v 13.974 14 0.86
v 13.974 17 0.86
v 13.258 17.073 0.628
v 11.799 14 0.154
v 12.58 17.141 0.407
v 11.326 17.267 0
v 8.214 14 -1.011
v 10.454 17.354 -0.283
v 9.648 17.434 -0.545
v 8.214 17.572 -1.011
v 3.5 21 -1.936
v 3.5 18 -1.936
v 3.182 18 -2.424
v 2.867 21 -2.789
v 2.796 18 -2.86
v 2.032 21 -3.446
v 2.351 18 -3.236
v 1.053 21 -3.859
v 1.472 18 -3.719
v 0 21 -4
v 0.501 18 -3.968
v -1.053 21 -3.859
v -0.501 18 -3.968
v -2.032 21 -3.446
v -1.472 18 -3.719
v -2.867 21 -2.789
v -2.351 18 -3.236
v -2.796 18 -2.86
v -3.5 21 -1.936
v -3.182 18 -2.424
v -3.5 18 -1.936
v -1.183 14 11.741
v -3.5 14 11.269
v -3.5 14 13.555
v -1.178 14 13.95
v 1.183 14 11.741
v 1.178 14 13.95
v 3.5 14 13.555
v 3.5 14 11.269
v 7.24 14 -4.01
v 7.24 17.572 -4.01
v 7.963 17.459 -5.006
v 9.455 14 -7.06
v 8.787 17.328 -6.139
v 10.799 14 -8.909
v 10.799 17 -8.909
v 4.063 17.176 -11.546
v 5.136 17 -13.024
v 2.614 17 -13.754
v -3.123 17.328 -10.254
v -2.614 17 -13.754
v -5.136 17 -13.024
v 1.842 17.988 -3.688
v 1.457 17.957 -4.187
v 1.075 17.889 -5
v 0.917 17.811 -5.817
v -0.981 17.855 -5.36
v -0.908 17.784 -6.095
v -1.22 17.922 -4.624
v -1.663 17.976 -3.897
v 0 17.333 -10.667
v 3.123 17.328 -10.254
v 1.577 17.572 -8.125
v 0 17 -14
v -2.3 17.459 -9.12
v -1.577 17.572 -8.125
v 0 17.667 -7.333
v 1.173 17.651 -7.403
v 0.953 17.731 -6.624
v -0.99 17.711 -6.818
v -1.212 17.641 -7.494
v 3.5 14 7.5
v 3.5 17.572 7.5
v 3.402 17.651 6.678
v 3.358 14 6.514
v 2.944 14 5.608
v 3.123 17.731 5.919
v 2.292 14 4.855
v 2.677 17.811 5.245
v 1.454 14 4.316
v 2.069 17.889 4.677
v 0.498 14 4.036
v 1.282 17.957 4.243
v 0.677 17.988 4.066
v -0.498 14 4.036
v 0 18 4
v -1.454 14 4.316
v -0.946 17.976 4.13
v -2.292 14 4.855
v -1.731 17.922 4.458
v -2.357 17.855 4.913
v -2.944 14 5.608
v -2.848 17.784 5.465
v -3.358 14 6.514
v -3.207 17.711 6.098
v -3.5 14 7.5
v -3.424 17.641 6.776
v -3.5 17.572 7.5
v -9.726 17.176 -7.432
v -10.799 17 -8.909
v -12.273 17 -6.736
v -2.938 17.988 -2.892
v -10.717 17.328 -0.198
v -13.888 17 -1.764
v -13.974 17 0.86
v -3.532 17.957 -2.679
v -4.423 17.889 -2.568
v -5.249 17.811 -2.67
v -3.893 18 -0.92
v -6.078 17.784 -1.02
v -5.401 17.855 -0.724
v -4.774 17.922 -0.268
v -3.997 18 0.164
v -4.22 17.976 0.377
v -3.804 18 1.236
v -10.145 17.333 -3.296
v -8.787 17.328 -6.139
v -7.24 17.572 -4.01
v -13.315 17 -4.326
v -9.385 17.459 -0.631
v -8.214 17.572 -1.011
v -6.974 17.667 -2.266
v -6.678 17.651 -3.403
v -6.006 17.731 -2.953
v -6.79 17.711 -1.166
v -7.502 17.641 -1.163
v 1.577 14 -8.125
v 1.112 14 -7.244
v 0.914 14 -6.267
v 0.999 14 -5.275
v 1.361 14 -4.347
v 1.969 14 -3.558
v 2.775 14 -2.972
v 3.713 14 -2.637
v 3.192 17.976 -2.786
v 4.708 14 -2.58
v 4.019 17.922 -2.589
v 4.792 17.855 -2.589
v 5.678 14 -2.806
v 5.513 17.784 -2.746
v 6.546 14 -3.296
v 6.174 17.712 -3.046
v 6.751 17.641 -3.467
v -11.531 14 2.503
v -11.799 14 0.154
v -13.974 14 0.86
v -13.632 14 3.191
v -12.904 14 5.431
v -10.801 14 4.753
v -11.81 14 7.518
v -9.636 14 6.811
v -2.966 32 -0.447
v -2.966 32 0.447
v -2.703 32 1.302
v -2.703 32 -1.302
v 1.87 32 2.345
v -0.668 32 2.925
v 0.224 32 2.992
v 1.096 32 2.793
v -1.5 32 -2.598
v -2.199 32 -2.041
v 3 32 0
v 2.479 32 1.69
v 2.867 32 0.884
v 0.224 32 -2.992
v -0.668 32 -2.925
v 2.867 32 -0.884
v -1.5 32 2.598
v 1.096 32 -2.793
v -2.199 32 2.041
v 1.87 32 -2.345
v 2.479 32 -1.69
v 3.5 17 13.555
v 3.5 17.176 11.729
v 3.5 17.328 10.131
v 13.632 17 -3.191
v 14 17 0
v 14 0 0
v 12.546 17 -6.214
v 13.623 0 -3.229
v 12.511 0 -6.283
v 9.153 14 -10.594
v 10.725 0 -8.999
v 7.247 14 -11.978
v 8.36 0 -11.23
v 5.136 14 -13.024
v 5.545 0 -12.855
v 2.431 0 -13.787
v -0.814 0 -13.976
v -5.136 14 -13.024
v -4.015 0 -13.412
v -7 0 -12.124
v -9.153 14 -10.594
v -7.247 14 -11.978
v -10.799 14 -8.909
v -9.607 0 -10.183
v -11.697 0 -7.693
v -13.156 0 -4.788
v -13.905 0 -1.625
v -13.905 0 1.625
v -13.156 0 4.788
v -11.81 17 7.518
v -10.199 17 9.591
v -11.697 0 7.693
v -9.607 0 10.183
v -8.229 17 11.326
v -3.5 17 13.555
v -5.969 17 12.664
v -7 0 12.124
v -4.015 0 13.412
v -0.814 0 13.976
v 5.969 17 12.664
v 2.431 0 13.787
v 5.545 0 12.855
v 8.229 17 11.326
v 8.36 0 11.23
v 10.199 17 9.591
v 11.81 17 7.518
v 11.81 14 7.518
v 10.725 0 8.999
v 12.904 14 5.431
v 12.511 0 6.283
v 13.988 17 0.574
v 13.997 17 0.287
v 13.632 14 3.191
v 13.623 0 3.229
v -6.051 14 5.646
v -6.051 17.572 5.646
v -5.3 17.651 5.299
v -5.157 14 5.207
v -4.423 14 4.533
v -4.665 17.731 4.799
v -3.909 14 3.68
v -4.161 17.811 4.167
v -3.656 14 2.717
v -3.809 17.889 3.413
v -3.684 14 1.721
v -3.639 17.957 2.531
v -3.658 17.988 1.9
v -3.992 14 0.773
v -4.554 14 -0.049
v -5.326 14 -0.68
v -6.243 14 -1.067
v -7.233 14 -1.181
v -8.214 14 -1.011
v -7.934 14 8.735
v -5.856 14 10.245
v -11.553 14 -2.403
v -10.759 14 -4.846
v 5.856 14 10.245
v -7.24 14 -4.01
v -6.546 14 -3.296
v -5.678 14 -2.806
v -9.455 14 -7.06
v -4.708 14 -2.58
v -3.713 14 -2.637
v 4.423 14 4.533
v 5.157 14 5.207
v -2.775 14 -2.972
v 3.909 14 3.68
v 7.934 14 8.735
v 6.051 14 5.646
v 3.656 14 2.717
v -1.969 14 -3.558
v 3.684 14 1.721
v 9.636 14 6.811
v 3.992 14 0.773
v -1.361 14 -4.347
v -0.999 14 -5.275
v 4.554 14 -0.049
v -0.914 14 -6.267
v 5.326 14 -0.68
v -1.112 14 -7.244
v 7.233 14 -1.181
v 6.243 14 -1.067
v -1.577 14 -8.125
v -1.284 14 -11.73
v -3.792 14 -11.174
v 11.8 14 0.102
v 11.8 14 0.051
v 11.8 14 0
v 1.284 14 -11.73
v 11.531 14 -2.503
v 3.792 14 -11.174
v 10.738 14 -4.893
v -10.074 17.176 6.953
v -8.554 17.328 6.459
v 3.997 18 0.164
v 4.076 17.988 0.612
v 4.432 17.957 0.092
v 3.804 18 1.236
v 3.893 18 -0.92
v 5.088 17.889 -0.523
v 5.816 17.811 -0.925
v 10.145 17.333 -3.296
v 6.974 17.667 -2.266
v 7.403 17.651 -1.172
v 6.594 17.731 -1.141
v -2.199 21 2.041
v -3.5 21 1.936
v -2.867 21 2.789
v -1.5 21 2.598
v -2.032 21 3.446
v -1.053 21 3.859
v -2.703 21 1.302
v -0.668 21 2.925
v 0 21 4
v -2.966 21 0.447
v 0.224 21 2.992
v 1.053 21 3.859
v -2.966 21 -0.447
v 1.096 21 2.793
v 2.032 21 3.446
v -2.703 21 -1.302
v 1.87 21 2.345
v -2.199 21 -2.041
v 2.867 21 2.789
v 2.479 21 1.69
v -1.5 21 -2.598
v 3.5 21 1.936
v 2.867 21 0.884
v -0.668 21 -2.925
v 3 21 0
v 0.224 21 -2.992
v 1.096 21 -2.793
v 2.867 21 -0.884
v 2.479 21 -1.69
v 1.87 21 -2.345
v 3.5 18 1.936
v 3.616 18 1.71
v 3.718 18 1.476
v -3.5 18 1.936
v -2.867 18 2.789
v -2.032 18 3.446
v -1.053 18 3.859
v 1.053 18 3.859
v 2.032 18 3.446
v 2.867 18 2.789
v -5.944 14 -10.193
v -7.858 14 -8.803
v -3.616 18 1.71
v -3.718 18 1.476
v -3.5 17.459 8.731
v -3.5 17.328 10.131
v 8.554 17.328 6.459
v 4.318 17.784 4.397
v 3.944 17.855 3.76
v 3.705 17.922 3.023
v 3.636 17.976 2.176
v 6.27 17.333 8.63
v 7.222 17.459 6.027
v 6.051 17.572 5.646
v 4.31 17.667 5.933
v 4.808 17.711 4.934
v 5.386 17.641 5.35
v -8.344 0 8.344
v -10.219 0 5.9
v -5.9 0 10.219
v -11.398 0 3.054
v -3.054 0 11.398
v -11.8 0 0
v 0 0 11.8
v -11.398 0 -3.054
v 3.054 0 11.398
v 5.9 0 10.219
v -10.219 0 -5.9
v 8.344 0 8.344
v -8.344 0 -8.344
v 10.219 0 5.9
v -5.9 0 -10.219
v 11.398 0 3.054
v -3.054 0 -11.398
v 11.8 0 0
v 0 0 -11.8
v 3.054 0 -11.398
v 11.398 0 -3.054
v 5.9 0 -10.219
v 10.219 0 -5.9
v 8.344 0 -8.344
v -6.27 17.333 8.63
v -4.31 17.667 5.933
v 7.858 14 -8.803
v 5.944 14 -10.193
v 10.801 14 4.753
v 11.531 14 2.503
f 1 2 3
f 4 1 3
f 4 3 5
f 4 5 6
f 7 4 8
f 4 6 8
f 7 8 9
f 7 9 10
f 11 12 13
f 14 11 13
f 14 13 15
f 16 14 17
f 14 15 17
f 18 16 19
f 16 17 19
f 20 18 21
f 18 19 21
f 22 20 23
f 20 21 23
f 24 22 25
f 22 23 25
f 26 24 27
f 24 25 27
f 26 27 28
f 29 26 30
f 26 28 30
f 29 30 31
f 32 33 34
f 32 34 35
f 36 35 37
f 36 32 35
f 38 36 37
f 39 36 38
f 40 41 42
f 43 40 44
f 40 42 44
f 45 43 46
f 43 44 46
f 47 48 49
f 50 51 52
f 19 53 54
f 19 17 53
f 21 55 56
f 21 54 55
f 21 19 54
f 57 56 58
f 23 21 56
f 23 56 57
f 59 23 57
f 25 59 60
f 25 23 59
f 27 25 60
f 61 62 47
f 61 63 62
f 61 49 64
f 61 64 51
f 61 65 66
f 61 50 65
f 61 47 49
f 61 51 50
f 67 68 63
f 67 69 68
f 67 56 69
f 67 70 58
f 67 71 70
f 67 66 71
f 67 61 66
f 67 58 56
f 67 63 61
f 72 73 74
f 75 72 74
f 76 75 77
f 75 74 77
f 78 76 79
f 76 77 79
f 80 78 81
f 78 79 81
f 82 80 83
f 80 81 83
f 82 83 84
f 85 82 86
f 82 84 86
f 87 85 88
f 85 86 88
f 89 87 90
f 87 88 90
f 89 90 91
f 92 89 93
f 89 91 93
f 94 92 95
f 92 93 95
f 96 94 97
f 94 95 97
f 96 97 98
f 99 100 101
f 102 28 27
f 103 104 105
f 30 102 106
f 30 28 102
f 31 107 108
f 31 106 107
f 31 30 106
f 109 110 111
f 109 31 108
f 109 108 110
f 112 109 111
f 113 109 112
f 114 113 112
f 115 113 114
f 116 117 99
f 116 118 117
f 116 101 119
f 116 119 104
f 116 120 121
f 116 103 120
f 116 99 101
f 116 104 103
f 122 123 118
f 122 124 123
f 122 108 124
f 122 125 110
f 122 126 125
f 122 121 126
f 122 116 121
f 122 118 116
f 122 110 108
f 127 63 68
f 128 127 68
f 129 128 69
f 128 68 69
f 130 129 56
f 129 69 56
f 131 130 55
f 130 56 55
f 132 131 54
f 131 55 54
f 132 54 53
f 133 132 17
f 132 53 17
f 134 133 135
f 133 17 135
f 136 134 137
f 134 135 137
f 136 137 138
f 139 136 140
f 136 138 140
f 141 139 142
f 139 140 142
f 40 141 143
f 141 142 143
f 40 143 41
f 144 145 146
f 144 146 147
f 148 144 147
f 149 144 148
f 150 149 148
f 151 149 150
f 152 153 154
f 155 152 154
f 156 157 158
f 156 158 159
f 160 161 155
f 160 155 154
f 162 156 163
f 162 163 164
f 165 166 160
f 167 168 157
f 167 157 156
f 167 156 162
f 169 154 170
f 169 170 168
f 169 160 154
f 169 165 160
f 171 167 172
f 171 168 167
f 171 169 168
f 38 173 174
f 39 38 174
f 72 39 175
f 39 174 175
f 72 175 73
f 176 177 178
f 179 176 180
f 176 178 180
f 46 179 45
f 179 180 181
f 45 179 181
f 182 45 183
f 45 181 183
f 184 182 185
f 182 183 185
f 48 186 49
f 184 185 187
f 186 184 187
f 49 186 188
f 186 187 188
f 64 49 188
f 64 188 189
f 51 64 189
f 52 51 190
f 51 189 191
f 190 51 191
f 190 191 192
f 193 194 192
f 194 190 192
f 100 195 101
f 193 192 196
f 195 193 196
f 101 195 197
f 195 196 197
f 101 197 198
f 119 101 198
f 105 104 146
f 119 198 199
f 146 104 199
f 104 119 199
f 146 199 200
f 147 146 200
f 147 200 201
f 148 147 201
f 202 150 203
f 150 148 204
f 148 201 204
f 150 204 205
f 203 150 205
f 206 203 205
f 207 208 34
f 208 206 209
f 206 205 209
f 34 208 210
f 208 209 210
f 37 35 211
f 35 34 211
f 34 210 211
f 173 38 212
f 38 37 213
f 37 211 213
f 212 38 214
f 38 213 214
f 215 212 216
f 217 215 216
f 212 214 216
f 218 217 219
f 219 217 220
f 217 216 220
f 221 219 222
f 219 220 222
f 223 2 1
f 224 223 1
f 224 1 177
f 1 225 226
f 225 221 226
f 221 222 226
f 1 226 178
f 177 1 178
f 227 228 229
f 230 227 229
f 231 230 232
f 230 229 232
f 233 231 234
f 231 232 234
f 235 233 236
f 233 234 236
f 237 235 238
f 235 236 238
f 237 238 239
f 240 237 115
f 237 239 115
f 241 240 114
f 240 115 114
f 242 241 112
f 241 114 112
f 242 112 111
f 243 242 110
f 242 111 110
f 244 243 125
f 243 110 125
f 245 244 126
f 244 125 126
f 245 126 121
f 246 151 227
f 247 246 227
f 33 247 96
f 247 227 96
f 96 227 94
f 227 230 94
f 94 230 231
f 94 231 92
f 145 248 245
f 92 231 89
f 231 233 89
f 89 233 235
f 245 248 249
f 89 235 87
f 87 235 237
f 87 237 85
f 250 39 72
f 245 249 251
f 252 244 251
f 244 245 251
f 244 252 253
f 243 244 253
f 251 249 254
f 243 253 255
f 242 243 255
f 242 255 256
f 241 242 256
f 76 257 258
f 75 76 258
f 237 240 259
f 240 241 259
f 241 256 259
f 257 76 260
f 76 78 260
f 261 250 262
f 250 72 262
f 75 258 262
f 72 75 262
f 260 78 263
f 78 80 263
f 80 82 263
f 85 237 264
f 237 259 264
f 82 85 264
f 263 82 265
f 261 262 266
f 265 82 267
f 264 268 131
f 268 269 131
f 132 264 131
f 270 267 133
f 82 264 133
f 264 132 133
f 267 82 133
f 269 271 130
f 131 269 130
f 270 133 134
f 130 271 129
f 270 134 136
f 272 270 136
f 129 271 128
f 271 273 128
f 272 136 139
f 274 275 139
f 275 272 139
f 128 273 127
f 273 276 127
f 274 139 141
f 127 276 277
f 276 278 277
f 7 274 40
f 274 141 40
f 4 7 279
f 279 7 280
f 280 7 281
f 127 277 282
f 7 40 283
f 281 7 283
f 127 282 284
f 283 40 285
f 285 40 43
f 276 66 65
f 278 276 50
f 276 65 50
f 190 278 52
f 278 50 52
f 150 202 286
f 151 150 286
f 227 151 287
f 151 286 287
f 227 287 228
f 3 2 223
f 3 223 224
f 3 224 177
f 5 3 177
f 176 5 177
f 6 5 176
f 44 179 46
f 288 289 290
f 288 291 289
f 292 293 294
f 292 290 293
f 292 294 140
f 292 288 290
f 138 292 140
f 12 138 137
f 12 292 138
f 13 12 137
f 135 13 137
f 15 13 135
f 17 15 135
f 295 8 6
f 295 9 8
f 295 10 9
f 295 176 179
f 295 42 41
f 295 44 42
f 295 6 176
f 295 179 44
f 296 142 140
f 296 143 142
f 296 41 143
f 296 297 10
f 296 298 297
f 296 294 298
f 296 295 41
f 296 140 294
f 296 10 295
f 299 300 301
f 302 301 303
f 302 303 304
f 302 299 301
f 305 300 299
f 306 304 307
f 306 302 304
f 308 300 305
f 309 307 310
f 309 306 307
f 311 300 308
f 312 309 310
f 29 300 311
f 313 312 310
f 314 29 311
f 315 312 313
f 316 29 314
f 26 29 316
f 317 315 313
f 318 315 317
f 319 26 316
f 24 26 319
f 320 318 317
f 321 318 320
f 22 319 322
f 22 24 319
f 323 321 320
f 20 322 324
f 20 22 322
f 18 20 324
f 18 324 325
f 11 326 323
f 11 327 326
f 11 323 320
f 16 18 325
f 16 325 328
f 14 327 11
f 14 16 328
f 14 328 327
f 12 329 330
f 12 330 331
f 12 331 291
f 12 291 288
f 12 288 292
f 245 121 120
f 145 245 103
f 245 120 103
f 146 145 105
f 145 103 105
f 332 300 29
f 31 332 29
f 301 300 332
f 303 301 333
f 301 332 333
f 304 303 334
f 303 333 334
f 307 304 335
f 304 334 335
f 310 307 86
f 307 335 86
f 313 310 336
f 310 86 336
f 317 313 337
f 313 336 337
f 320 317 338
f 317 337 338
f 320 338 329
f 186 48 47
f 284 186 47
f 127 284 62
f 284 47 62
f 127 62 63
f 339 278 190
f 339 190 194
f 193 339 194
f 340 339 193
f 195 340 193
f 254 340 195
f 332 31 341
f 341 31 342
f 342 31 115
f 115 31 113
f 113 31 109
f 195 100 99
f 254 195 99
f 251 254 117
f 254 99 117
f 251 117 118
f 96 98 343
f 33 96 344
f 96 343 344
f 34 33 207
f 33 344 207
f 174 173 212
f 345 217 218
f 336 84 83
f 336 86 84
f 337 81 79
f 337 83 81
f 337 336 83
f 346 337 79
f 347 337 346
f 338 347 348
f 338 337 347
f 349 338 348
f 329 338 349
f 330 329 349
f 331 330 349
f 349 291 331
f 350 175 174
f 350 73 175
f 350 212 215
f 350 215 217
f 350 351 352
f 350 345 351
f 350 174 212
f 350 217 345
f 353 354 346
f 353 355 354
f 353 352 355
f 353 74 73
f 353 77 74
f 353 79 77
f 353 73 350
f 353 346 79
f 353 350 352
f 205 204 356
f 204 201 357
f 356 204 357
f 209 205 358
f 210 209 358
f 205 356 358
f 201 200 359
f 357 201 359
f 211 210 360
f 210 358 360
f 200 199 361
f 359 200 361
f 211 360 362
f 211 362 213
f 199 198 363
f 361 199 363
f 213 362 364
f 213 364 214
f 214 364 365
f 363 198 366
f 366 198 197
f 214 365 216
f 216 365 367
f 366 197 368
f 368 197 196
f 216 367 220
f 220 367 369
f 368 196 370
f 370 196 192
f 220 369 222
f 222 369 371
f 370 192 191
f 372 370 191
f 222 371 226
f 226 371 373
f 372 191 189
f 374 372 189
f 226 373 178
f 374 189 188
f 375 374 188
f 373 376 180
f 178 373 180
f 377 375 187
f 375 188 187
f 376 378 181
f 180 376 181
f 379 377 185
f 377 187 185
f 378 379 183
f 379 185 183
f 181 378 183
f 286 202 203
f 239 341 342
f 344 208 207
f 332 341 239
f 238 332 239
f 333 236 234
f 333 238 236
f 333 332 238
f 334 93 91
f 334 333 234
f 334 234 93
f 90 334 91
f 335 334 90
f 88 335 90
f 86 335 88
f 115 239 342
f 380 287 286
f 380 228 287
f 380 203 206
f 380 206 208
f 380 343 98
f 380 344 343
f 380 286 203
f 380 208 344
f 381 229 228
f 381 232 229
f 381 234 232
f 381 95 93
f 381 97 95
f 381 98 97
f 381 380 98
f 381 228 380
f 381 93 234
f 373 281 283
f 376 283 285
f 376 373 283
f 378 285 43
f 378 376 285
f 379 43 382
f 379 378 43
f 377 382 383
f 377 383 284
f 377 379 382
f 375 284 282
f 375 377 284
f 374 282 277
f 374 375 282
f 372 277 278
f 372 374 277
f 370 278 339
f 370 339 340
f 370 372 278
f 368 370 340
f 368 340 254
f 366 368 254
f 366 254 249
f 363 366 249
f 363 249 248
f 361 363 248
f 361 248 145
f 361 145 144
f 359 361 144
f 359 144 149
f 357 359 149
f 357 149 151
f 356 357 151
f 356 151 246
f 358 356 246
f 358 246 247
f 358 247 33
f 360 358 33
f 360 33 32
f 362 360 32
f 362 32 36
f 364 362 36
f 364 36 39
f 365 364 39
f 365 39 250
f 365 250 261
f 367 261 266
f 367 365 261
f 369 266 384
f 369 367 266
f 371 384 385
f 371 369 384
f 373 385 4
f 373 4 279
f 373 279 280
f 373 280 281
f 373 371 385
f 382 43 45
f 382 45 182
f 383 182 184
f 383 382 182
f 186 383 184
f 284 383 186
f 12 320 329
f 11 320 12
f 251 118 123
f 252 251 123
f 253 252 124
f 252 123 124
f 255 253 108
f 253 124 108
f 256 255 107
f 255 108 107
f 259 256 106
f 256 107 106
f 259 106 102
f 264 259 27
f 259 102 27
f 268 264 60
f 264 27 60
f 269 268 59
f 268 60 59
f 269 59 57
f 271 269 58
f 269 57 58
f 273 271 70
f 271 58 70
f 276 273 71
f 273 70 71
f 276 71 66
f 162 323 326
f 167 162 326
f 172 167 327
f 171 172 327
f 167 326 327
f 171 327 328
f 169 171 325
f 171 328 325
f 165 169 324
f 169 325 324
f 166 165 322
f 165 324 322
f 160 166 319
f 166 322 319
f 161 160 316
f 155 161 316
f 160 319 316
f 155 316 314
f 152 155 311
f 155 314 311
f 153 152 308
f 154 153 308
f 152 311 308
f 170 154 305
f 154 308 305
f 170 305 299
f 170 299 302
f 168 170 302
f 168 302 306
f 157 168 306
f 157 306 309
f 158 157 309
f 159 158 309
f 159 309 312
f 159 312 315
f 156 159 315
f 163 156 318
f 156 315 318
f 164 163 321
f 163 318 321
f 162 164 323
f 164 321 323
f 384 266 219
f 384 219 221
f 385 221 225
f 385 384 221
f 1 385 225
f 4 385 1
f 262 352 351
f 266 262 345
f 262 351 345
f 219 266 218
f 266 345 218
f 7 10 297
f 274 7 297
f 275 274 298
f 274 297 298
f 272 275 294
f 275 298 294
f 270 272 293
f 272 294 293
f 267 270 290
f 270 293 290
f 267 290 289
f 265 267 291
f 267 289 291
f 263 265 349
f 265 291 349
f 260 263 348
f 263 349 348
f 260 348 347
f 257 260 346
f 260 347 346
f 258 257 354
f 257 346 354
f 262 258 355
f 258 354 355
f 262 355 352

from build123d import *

# Parameters (mm, degrees)
SKETCH_1_R               = 14
SKETCH_1_R_2             = 11.8
EXTRUDE_1_DEPTH          = 14
SKETCH_2_R               = 14
EXTRUDE_2_DEPTH          = 4
CHAMFER_1_SIZE           = 1
CHAMFER_1_SIZE2          = 10
SKETCH_3_R               = 4
EXTRUDE_3_DEPTH          = 3
SKETCH_4_R               = 3
EXTRUDE_4_DEPTH          = 11
SKETCH_5_W               = 6.079740031
SKETCH_5_H               = 11.892824797
SKETCH_5_W_2             = 4.533139496
SKETCH_5_H_2             = 13.012776908
CUT_EXTRUDE_1_DEPTH      = 3
CUT_EXTRUDE_2_DEPTH      = 4
PATTERN_CIRCULAR_1_COUNT = 5


with BuildPart() as part:
    # Эскиз1 → Бобышка-Вытянуть1 (new body)
    with BuildSketch(Plane(origin=(0, 0, 0), x_dir=(1, 0, 0), z_dir=(0, 1, 0))):
        Circle(SKETCH_1_R)
        Circle(SKETCH_1_R_2, mode=Mode.SUBTRACT)
    extrude(amount=EXTRUDE_1_DEPTH)

    # Эскиз2 → Бобышка-Вытянуть2 (add)
    with BuildSketch(Plane(origin=(0, 14, 0), x_dir=(1, 0, 0), z_dir=(0, 1, 0))):
        Circle(SKETCH_2_R)
    extrude(amount=EXTRUDE_2_DEPTH)

    # Фаска1
    chamfer_1_edges = [part.edges().sort_by_distance(p)[0] for p in [
        (-14, 18, 0),
    ]]
    chamfer_1_side = [part.faces().sort_by_distance(p)[0] for p in [
        (-14, 9, 0),
    ]]
    chamfer(chamfer_1_edges, length=CHAMFER_1_SIZE, length2=CHAMFER_1_SIZE2, reference=chamfer_1_side[0])

    # Эскиз3 → Бобышка-Вытянуть3 (add)
    with BuildSketch(Plane(origin=(0, 18, 0), x_dir=(1, 0, 0), z_dir=(0, 1, 0))):
        Circle(SKETCH_3_R)
    extrude(amount=EXTRUDE_3_DEPTH)

    # Эскиз4 → Бобышка-Вытянуть4 (add)
    with BuildSketch(Plane(origin=(0, 21, 0), x_dir=(1, 0, 0), z_dir=(0, 1, 0))):
        Circle(SKETCH_4_R)
    extrude(amount=EXTRUDE_4_DEPTH)

    # Эскиз5 → Вырез-Вытянуть1 (cut)
    with BuildSketch(Plane(origin=(0, 21, 0), x_dir=(1, 0, 0), z_dir=(0, 1, 0))):
        with Locations((-6.539870016, -0.426648424)):
            Rectangle(SKETCH_5_W, SKETCH_5_H)
        with Locations((5.766569748, 0.133327632)):
            Rectangle(SKETCH_5_W_2, SKETCH_5_H_2)
    extrude(amount=-CUT_EXTRUDE_1_DEPTH, mode=Mode.SUBTRACT)

    # Эскиз6 → Вырез-Вытянуть2 (cut)
    with BuildSketch(Plane(origin=(0, 18, 0), x_dir=(1, 0, 0), z_dir=(0, 1, 0))):
        with BuildLine():
            Line((-3.5, -7.5), (-3.5, -15.705995079))
            Line((-3.5, -15.705995079), (3.5, -15.705995079))
            Line((3.5, -15.705995079), (3.5, -7.5))
            ThreePointArc((3.5, -7.5), (0, -4), (-3.5, -7.5))
        make_face()
    cut_extrude_2 = extrude(amount=-CUT_EXTRUDE_2_DEPTH, mode=Mode.SUBTRACT)

    # Круговой массив1: Вырез-Вытянуть2 ×5 about axis
    pattern_circular_1_axis = Axis((0, 0, 0), (0, 1, 0))
    for i in range(1, PATTERN_CIRCULAR_1_COUNT):
        add(cut_extrude_2.rotate(pattern_circular_1_axis, i * 360 / PATTERN_CIRCULAR_1_COUNT), mode=Mode.SUBTRACT)


solid = part.part
